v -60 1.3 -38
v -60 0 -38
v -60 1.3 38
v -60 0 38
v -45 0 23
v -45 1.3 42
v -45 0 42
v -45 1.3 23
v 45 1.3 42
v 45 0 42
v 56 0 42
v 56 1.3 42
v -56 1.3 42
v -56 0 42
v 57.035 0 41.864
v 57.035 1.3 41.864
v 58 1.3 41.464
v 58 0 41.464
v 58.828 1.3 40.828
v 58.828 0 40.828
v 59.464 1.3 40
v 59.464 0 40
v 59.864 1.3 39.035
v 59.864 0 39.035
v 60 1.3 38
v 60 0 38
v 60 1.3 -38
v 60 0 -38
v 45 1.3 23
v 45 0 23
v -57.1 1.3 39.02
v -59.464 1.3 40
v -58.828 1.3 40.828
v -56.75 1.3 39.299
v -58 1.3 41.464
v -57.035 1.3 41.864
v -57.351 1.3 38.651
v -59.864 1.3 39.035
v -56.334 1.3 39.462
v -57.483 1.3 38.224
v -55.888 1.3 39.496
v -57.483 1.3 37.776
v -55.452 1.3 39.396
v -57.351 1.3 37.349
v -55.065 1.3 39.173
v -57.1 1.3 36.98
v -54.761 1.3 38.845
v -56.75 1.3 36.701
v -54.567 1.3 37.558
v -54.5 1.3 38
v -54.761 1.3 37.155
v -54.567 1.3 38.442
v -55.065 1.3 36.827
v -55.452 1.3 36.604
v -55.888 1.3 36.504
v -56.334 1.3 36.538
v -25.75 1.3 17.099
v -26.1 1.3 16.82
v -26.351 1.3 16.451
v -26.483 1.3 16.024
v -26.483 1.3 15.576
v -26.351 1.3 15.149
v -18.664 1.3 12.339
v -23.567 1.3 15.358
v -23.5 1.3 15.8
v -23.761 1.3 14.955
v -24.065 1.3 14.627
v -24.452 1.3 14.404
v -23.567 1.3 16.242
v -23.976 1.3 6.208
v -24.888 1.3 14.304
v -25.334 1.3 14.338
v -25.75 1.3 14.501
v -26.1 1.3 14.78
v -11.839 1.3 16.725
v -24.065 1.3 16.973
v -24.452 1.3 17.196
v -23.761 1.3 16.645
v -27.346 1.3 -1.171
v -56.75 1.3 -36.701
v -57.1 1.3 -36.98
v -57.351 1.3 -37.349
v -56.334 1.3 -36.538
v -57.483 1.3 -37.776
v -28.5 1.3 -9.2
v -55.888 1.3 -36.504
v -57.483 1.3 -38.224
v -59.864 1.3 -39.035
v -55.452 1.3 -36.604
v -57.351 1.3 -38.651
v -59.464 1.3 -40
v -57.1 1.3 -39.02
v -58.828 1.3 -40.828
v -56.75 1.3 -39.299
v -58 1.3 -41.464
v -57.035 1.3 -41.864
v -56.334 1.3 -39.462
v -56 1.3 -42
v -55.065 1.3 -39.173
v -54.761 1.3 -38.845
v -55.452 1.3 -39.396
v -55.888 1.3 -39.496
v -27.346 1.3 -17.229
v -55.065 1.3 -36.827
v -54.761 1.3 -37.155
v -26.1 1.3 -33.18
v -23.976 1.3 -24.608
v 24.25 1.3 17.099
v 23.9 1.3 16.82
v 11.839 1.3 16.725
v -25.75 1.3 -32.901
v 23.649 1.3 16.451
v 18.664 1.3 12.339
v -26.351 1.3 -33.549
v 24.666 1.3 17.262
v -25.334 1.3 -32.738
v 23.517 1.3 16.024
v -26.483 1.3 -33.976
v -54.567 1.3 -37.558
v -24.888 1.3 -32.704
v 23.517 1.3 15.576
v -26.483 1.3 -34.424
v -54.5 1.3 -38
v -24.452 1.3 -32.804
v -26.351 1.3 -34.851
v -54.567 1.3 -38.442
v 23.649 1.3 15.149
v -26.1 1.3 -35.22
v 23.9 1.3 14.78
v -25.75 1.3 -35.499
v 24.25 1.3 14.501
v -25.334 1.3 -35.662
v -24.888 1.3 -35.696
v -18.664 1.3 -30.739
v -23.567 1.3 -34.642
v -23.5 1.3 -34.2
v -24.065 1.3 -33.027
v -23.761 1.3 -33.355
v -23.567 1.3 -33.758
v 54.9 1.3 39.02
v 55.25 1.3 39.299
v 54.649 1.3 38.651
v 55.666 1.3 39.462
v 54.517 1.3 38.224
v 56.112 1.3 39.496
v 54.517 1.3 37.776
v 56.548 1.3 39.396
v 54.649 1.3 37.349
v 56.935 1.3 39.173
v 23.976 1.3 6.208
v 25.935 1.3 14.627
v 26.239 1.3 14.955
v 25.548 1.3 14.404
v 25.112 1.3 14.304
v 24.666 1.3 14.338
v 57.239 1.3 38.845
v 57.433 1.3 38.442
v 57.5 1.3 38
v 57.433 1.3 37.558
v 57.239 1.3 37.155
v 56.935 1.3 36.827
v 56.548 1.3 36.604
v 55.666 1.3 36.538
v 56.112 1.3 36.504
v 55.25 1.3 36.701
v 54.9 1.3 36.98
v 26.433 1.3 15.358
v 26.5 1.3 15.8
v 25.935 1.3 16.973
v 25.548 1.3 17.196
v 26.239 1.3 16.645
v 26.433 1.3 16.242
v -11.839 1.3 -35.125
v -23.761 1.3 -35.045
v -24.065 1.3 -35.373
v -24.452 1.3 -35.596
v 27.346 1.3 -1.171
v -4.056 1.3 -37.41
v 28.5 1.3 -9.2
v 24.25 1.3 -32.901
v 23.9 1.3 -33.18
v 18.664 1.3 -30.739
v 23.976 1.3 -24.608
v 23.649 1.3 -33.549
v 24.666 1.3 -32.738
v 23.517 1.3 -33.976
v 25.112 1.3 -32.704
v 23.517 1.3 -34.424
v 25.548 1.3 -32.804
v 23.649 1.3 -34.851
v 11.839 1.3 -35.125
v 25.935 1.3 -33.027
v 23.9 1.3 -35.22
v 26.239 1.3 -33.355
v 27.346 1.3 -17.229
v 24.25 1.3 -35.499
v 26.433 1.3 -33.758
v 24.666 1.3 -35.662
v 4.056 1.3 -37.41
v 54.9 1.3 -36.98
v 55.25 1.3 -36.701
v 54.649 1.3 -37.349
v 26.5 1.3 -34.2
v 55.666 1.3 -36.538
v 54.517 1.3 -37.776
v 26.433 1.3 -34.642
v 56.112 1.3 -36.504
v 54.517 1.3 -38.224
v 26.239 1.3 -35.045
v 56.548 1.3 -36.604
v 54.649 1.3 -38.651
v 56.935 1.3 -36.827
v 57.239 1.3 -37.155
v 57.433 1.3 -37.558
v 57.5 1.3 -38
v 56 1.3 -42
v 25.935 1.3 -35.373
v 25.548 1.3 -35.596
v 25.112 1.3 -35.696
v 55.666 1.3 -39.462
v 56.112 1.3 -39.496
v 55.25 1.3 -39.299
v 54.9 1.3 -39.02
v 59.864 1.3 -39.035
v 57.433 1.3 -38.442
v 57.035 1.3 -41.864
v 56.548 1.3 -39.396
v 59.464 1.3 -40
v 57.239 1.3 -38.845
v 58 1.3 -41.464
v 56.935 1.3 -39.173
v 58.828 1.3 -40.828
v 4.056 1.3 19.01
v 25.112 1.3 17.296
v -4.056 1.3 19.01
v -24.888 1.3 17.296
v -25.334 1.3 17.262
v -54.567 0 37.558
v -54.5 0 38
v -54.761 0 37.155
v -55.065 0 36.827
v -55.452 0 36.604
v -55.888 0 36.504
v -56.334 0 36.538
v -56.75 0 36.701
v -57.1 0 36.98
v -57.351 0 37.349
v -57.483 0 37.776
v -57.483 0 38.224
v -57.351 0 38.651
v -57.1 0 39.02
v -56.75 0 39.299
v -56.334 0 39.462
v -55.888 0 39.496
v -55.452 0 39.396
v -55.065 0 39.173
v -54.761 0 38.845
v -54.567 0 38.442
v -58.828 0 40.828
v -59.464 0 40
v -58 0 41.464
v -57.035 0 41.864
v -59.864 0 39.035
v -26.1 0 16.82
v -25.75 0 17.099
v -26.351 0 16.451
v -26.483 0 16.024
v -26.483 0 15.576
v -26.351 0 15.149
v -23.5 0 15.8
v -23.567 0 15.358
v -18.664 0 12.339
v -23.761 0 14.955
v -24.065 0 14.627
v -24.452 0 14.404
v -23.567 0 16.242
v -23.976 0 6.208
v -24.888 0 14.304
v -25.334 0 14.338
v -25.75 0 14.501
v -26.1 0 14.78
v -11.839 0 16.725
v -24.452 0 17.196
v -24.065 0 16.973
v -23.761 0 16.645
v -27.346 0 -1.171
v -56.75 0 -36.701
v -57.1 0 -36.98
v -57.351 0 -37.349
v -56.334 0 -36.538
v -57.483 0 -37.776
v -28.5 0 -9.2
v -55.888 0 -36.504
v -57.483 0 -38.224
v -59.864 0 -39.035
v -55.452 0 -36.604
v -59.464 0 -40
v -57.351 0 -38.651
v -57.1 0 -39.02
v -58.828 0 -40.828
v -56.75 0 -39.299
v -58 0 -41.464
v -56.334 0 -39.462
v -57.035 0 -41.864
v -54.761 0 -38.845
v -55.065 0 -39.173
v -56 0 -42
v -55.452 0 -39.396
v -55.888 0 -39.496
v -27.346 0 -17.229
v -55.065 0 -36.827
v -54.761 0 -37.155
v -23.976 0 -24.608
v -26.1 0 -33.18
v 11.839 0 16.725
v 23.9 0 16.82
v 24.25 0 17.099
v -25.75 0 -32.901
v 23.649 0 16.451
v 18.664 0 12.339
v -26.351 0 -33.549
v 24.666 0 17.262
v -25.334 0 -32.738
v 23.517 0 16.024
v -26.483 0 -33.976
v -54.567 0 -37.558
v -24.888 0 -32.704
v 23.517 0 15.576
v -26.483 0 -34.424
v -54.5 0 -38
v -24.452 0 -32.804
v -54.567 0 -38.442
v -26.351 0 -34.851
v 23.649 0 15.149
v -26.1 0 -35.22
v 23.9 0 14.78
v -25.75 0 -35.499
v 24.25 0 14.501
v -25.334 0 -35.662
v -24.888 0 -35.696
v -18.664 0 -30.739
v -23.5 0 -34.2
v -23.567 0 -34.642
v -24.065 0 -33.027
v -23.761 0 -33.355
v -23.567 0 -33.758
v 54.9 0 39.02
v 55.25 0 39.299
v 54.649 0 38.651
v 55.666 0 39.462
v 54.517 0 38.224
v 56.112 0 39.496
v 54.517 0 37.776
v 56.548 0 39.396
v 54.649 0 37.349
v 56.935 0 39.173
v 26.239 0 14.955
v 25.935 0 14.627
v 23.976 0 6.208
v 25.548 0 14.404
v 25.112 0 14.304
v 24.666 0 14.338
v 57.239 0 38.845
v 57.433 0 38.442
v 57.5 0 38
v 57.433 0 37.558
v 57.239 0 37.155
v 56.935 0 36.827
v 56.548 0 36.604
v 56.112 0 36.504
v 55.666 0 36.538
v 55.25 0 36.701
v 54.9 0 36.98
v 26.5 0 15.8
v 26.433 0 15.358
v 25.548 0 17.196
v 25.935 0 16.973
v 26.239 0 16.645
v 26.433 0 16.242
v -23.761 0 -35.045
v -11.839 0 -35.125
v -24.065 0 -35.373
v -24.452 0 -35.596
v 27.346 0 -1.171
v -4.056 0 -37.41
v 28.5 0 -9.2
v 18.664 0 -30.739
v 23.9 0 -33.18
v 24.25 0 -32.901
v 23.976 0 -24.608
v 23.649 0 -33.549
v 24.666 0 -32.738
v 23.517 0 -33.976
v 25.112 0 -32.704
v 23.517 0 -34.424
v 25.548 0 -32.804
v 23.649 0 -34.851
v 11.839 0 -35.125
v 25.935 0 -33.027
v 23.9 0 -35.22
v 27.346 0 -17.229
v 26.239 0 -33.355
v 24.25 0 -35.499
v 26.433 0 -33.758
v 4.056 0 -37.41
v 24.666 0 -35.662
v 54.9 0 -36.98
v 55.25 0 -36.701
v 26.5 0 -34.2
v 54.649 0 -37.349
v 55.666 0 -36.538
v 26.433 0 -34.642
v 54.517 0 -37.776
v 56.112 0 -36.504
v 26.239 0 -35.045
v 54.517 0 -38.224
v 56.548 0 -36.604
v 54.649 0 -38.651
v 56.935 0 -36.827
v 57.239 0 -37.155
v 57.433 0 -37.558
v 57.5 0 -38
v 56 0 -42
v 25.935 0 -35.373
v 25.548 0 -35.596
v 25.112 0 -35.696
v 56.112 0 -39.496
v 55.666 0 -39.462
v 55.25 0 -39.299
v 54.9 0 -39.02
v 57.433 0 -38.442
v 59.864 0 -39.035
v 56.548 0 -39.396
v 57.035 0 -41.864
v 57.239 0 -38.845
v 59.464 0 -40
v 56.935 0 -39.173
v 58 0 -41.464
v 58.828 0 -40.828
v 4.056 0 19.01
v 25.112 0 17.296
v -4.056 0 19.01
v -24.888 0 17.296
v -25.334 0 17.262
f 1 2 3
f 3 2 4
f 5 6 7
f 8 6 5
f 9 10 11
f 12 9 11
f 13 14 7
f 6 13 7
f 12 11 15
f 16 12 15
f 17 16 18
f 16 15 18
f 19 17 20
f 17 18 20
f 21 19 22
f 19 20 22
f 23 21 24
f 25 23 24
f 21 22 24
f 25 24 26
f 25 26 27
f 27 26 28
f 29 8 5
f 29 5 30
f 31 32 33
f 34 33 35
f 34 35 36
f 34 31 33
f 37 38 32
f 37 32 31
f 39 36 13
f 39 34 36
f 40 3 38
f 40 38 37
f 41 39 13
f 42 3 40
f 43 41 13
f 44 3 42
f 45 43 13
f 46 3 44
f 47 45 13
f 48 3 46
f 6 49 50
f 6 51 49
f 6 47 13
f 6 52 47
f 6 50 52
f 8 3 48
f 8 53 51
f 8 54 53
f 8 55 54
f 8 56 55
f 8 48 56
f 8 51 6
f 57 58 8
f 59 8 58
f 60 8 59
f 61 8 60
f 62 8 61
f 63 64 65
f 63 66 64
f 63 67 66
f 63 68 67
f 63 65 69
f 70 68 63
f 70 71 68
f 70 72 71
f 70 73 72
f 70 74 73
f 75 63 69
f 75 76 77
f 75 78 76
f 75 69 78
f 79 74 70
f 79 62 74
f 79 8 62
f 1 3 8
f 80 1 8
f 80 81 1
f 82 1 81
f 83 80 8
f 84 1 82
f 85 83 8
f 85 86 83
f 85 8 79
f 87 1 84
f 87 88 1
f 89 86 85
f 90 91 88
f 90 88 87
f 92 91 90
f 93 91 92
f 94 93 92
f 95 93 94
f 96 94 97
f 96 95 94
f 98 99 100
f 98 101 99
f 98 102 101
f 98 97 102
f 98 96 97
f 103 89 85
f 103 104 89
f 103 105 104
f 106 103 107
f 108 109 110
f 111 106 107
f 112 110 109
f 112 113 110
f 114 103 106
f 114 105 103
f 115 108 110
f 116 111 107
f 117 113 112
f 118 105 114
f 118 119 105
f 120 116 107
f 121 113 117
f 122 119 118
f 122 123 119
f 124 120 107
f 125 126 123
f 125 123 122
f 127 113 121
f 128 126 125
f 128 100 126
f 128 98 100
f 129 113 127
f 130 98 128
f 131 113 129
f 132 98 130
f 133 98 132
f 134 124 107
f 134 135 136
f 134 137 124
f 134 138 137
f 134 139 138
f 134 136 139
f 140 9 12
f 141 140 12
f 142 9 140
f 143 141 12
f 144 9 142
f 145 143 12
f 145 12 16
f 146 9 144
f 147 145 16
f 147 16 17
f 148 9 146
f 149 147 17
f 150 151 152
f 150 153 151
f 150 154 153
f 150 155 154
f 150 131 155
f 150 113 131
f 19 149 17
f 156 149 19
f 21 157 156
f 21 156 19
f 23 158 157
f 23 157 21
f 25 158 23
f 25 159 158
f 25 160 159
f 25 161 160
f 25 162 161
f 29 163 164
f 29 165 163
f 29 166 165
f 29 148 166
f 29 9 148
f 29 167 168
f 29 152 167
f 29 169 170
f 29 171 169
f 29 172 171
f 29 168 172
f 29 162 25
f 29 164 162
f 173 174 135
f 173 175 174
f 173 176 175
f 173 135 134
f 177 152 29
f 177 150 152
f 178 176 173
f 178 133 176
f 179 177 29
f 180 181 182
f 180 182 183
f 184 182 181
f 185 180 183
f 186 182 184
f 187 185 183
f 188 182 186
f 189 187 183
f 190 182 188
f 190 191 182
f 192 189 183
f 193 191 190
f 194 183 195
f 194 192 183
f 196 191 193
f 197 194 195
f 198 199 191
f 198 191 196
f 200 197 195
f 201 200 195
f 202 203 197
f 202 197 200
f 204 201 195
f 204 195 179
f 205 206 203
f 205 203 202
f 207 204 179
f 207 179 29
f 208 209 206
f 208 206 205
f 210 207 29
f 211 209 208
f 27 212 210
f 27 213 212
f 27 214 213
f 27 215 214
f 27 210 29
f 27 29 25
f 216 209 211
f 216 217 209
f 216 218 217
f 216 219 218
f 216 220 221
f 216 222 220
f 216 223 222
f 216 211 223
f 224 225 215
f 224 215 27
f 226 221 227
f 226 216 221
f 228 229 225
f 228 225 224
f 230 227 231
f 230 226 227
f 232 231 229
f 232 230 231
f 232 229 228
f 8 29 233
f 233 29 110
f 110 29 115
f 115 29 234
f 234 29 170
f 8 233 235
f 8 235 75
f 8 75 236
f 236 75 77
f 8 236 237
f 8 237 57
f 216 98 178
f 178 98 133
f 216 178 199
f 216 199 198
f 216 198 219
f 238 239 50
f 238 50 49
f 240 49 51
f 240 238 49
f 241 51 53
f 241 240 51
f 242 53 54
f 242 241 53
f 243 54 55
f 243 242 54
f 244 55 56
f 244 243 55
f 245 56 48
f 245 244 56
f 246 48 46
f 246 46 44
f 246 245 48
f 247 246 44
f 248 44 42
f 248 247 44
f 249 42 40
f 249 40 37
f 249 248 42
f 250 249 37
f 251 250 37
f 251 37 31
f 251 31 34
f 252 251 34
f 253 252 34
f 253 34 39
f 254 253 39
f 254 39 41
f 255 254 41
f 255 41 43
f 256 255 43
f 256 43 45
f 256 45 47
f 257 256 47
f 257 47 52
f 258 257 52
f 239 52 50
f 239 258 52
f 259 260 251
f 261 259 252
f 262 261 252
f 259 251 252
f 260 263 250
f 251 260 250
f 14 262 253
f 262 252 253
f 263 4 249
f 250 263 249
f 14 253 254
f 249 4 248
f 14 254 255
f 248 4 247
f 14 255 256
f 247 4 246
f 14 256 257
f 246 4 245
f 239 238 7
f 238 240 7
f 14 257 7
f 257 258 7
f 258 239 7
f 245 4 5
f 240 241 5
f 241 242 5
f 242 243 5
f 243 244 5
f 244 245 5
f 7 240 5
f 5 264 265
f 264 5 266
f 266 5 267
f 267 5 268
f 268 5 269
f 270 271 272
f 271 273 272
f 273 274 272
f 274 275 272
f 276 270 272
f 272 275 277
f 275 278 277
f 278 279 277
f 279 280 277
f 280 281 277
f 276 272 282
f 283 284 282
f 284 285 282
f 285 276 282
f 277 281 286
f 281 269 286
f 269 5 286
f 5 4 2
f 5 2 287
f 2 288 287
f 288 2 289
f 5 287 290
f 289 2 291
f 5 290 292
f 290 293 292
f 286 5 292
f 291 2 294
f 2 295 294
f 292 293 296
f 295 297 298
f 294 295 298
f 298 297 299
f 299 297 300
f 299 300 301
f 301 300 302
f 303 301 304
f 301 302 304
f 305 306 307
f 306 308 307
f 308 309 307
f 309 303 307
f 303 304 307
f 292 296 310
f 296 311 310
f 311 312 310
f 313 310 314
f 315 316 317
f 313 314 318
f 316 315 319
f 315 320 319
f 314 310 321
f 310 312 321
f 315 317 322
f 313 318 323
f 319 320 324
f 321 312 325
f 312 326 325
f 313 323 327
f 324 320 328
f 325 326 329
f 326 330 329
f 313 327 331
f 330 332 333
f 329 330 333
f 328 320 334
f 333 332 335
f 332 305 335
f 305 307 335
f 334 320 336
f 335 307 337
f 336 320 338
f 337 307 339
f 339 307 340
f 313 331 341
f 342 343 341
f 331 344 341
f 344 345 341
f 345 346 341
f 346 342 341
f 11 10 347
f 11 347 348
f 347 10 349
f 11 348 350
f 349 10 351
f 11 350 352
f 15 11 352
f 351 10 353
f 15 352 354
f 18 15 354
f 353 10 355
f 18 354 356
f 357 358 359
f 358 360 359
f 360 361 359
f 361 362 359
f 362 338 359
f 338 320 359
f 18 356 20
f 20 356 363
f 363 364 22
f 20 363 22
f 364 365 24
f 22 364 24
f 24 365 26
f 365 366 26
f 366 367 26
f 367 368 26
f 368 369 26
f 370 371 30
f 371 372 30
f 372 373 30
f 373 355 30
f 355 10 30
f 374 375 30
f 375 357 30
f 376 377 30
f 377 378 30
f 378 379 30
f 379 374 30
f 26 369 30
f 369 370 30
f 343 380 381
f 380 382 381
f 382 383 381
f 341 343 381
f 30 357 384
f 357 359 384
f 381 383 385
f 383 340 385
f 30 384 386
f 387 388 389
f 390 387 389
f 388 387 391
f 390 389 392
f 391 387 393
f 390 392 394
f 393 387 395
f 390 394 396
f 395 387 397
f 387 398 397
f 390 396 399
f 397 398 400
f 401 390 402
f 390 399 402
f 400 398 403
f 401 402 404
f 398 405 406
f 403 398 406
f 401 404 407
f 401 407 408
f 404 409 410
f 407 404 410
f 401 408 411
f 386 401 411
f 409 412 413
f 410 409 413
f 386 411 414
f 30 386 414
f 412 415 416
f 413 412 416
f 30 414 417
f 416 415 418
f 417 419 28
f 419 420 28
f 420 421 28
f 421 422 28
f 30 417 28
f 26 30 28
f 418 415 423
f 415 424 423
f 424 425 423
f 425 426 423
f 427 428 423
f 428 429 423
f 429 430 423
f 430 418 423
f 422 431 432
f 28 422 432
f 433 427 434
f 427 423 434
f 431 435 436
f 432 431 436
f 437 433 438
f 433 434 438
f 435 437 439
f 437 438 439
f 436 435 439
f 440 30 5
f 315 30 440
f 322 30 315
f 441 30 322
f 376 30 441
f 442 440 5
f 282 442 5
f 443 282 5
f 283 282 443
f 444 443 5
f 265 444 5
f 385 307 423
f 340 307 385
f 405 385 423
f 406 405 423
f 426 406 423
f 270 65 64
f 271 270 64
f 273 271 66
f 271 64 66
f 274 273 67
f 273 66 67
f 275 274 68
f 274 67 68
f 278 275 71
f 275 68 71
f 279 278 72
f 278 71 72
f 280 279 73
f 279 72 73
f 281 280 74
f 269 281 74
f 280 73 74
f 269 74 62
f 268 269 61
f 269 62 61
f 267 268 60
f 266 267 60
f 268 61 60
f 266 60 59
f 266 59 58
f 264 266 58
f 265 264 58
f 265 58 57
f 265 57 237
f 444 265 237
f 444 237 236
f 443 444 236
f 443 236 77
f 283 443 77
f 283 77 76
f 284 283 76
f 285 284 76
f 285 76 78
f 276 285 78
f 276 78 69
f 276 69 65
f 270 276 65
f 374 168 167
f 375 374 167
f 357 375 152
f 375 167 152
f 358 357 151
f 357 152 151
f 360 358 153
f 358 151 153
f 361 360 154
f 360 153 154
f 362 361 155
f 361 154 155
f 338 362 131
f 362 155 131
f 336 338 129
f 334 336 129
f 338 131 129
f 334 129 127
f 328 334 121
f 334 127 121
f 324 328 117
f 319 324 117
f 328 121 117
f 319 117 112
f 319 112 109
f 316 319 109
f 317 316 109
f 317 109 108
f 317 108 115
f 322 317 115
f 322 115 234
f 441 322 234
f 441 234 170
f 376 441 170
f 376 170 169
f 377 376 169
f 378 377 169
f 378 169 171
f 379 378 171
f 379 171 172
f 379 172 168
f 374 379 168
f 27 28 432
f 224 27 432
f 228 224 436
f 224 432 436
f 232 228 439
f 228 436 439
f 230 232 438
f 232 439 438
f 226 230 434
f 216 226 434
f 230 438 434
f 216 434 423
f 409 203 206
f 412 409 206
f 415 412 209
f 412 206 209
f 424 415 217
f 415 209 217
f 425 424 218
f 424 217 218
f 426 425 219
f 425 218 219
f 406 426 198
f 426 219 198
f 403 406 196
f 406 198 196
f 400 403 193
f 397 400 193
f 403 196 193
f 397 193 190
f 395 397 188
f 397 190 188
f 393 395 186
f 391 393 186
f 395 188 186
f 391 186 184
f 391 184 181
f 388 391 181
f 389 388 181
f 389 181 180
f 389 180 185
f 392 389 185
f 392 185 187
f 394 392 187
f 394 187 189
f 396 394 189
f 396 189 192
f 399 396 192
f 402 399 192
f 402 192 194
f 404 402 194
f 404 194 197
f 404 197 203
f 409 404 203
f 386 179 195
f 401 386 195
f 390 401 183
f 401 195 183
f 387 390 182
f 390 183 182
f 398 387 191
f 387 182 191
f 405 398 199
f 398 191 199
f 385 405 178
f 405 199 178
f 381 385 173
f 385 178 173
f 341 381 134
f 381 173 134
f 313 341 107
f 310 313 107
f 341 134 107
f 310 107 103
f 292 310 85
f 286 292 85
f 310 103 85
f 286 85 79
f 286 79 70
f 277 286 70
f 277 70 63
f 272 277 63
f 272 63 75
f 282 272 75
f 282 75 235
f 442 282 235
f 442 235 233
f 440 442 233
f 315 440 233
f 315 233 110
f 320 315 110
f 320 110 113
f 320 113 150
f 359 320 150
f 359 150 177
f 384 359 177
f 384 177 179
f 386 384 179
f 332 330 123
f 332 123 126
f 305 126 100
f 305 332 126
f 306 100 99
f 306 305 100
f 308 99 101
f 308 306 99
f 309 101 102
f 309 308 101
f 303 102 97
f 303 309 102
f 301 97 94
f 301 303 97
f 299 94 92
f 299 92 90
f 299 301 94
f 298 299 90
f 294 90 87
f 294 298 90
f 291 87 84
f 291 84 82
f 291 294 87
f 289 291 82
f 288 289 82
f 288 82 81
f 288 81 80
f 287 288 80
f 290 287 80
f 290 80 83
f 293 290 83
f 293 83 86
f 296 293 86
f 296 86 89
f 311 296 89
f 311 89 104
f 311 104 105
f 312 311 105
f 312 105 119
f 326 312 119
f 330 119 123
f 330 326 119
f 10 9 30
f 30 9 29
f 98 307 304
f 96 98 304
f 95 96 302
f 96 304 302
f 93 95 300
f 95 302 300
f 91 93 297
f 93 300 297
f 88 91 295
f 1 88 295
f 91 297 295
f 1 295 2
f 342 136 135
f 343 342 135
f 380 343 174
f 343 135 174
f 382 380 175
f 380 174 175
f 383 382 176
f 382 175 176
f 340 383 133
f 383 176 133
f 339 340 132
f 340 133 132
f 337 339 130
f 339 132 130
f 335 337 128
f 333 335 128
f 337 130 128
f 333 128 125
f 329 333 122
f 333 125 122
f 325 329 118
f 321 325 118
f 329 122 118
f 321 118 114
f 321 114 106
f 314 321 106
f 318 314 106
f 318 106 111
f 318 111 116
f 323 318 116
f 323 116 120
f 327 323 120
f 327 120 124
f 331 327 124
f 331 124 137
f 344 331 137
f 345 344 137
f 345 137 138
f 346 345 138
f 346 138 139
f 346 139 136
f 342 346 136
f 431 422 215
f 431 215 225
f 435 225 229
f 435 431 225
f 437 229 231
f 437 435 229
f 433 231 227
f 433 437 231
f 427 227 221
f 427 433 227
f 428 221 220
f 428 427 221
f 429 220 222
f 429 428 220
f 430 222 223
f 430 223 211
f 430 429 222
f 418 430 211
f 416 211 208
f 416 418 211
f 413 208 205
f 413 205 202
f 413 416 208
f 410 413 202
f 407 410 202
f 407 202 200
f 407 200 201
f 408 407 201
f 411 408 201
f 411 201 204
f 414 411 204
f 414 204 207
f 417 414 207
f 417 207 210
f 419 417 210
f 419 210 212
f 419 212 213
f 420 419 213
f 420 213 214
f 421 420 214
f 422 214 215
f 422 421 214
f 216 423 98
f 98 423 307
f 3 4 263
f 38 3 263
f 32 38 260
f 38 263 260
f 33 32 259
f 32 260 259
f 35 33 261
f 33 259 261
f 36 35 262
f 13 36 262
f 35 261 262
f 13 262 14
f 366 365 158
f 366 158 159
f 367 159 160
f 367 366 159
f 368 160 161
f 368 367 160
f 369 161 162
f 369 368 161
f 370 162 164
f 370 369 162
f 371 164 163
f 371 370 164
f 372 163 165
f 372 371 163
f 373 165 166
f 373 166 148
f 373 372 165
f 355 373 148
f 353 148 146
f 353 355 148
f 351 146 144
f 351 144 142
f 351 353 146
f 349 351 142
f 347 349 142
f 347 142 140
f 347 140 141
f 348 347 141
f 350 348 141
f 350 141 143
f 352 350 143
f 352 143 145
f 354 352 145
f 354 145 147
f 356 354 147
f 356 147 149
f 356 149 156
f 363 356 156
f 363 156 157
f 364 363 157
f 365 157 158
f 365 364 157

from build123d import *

# Parameters (mm, degrees)
SKETCH1_R           = 1.5
BOSS_EXTRUDE1_DEPTH = 1.3
SKETCH2_R           = 28.5
SKETCH2_R_2         = 1.5
SKETCH2_W           = 90
SKETCH2_H           = 19
CUT_EXTRUDE1_DEPTH  = 10


with BuildPart() as part:
    # Sketch1 → Boss-Extrude1 (new body)
    with BuildSketch(Plane(origin=(0, 0, 0), x_dir=(1, 0, 0), z_dir=(0, 1, 0))):
        with BuildLine():
            Line((-56, -42), (56, -42))
            ThreePointArc((56, -42), (58.828427125, -40.828427125), (60, -38))
            Line((60, -38), (60, 38))
            ThreePointArc((60, 38), (58.828427125, 40.828427125), (56, 42))
            Line((56, 42), (-56, 42))
            ThreePointArc((-56, 42), (-58.828427125, 40.828427125), (-60, 38))
            Line((-60, 38), (-60, -38))
            ThreePointArc((-60, -38), (-58.828427125, -40.828427125), (-56, -42))
        make_face()
        with Locations((-56, 38)):
            Circle(SKETCH1_R, mode=Mode.SUBTRACT)
        with Locations((56, 38)):
            Circle(SKETCH1_R, mode=Mode.SUBTRACT)
        with Locations((56, -38)):
            Circle(SKETCH1_R, mode=Mode.SUBTRACT)
        with Locations((-56, -38)):
            Circle(SKETCH1_R, mode=Mode.SUBTRACT)
    extrude(amount=BOSS_EXTRUDE1_DEPTH)

    # Sketch2 → Cut-Extrude1 (cut)
    with BuildSketch(Plane(origin=(0, 1.3, 0), x_dir=(1, 0, 0), z_dir=(0, 1, 0))):
        with Locations((0, 9.2)):
            Circle(SKETCH2_R)
        with Locations((-25, 34.2)):
            Circle(SKETCH2_R_2)
        with Locations((25, 34.2)):
            Circle(SKETCH2_R_2)
        with Locations((25, -15.8)):
            Circle(SKETCH2_R_2)
        with Locations((-25, -15.8)):
            Circle(SKETCH2_R_2)
        with Locations((0, -32.5)):
            Rectangle(SKETCH2_W, SKETCH2_H)
    extrude(amount=-CUT_EXTRUDE1_DEPTH, mode=Mode.SUBTRACT)


solid = part.part
